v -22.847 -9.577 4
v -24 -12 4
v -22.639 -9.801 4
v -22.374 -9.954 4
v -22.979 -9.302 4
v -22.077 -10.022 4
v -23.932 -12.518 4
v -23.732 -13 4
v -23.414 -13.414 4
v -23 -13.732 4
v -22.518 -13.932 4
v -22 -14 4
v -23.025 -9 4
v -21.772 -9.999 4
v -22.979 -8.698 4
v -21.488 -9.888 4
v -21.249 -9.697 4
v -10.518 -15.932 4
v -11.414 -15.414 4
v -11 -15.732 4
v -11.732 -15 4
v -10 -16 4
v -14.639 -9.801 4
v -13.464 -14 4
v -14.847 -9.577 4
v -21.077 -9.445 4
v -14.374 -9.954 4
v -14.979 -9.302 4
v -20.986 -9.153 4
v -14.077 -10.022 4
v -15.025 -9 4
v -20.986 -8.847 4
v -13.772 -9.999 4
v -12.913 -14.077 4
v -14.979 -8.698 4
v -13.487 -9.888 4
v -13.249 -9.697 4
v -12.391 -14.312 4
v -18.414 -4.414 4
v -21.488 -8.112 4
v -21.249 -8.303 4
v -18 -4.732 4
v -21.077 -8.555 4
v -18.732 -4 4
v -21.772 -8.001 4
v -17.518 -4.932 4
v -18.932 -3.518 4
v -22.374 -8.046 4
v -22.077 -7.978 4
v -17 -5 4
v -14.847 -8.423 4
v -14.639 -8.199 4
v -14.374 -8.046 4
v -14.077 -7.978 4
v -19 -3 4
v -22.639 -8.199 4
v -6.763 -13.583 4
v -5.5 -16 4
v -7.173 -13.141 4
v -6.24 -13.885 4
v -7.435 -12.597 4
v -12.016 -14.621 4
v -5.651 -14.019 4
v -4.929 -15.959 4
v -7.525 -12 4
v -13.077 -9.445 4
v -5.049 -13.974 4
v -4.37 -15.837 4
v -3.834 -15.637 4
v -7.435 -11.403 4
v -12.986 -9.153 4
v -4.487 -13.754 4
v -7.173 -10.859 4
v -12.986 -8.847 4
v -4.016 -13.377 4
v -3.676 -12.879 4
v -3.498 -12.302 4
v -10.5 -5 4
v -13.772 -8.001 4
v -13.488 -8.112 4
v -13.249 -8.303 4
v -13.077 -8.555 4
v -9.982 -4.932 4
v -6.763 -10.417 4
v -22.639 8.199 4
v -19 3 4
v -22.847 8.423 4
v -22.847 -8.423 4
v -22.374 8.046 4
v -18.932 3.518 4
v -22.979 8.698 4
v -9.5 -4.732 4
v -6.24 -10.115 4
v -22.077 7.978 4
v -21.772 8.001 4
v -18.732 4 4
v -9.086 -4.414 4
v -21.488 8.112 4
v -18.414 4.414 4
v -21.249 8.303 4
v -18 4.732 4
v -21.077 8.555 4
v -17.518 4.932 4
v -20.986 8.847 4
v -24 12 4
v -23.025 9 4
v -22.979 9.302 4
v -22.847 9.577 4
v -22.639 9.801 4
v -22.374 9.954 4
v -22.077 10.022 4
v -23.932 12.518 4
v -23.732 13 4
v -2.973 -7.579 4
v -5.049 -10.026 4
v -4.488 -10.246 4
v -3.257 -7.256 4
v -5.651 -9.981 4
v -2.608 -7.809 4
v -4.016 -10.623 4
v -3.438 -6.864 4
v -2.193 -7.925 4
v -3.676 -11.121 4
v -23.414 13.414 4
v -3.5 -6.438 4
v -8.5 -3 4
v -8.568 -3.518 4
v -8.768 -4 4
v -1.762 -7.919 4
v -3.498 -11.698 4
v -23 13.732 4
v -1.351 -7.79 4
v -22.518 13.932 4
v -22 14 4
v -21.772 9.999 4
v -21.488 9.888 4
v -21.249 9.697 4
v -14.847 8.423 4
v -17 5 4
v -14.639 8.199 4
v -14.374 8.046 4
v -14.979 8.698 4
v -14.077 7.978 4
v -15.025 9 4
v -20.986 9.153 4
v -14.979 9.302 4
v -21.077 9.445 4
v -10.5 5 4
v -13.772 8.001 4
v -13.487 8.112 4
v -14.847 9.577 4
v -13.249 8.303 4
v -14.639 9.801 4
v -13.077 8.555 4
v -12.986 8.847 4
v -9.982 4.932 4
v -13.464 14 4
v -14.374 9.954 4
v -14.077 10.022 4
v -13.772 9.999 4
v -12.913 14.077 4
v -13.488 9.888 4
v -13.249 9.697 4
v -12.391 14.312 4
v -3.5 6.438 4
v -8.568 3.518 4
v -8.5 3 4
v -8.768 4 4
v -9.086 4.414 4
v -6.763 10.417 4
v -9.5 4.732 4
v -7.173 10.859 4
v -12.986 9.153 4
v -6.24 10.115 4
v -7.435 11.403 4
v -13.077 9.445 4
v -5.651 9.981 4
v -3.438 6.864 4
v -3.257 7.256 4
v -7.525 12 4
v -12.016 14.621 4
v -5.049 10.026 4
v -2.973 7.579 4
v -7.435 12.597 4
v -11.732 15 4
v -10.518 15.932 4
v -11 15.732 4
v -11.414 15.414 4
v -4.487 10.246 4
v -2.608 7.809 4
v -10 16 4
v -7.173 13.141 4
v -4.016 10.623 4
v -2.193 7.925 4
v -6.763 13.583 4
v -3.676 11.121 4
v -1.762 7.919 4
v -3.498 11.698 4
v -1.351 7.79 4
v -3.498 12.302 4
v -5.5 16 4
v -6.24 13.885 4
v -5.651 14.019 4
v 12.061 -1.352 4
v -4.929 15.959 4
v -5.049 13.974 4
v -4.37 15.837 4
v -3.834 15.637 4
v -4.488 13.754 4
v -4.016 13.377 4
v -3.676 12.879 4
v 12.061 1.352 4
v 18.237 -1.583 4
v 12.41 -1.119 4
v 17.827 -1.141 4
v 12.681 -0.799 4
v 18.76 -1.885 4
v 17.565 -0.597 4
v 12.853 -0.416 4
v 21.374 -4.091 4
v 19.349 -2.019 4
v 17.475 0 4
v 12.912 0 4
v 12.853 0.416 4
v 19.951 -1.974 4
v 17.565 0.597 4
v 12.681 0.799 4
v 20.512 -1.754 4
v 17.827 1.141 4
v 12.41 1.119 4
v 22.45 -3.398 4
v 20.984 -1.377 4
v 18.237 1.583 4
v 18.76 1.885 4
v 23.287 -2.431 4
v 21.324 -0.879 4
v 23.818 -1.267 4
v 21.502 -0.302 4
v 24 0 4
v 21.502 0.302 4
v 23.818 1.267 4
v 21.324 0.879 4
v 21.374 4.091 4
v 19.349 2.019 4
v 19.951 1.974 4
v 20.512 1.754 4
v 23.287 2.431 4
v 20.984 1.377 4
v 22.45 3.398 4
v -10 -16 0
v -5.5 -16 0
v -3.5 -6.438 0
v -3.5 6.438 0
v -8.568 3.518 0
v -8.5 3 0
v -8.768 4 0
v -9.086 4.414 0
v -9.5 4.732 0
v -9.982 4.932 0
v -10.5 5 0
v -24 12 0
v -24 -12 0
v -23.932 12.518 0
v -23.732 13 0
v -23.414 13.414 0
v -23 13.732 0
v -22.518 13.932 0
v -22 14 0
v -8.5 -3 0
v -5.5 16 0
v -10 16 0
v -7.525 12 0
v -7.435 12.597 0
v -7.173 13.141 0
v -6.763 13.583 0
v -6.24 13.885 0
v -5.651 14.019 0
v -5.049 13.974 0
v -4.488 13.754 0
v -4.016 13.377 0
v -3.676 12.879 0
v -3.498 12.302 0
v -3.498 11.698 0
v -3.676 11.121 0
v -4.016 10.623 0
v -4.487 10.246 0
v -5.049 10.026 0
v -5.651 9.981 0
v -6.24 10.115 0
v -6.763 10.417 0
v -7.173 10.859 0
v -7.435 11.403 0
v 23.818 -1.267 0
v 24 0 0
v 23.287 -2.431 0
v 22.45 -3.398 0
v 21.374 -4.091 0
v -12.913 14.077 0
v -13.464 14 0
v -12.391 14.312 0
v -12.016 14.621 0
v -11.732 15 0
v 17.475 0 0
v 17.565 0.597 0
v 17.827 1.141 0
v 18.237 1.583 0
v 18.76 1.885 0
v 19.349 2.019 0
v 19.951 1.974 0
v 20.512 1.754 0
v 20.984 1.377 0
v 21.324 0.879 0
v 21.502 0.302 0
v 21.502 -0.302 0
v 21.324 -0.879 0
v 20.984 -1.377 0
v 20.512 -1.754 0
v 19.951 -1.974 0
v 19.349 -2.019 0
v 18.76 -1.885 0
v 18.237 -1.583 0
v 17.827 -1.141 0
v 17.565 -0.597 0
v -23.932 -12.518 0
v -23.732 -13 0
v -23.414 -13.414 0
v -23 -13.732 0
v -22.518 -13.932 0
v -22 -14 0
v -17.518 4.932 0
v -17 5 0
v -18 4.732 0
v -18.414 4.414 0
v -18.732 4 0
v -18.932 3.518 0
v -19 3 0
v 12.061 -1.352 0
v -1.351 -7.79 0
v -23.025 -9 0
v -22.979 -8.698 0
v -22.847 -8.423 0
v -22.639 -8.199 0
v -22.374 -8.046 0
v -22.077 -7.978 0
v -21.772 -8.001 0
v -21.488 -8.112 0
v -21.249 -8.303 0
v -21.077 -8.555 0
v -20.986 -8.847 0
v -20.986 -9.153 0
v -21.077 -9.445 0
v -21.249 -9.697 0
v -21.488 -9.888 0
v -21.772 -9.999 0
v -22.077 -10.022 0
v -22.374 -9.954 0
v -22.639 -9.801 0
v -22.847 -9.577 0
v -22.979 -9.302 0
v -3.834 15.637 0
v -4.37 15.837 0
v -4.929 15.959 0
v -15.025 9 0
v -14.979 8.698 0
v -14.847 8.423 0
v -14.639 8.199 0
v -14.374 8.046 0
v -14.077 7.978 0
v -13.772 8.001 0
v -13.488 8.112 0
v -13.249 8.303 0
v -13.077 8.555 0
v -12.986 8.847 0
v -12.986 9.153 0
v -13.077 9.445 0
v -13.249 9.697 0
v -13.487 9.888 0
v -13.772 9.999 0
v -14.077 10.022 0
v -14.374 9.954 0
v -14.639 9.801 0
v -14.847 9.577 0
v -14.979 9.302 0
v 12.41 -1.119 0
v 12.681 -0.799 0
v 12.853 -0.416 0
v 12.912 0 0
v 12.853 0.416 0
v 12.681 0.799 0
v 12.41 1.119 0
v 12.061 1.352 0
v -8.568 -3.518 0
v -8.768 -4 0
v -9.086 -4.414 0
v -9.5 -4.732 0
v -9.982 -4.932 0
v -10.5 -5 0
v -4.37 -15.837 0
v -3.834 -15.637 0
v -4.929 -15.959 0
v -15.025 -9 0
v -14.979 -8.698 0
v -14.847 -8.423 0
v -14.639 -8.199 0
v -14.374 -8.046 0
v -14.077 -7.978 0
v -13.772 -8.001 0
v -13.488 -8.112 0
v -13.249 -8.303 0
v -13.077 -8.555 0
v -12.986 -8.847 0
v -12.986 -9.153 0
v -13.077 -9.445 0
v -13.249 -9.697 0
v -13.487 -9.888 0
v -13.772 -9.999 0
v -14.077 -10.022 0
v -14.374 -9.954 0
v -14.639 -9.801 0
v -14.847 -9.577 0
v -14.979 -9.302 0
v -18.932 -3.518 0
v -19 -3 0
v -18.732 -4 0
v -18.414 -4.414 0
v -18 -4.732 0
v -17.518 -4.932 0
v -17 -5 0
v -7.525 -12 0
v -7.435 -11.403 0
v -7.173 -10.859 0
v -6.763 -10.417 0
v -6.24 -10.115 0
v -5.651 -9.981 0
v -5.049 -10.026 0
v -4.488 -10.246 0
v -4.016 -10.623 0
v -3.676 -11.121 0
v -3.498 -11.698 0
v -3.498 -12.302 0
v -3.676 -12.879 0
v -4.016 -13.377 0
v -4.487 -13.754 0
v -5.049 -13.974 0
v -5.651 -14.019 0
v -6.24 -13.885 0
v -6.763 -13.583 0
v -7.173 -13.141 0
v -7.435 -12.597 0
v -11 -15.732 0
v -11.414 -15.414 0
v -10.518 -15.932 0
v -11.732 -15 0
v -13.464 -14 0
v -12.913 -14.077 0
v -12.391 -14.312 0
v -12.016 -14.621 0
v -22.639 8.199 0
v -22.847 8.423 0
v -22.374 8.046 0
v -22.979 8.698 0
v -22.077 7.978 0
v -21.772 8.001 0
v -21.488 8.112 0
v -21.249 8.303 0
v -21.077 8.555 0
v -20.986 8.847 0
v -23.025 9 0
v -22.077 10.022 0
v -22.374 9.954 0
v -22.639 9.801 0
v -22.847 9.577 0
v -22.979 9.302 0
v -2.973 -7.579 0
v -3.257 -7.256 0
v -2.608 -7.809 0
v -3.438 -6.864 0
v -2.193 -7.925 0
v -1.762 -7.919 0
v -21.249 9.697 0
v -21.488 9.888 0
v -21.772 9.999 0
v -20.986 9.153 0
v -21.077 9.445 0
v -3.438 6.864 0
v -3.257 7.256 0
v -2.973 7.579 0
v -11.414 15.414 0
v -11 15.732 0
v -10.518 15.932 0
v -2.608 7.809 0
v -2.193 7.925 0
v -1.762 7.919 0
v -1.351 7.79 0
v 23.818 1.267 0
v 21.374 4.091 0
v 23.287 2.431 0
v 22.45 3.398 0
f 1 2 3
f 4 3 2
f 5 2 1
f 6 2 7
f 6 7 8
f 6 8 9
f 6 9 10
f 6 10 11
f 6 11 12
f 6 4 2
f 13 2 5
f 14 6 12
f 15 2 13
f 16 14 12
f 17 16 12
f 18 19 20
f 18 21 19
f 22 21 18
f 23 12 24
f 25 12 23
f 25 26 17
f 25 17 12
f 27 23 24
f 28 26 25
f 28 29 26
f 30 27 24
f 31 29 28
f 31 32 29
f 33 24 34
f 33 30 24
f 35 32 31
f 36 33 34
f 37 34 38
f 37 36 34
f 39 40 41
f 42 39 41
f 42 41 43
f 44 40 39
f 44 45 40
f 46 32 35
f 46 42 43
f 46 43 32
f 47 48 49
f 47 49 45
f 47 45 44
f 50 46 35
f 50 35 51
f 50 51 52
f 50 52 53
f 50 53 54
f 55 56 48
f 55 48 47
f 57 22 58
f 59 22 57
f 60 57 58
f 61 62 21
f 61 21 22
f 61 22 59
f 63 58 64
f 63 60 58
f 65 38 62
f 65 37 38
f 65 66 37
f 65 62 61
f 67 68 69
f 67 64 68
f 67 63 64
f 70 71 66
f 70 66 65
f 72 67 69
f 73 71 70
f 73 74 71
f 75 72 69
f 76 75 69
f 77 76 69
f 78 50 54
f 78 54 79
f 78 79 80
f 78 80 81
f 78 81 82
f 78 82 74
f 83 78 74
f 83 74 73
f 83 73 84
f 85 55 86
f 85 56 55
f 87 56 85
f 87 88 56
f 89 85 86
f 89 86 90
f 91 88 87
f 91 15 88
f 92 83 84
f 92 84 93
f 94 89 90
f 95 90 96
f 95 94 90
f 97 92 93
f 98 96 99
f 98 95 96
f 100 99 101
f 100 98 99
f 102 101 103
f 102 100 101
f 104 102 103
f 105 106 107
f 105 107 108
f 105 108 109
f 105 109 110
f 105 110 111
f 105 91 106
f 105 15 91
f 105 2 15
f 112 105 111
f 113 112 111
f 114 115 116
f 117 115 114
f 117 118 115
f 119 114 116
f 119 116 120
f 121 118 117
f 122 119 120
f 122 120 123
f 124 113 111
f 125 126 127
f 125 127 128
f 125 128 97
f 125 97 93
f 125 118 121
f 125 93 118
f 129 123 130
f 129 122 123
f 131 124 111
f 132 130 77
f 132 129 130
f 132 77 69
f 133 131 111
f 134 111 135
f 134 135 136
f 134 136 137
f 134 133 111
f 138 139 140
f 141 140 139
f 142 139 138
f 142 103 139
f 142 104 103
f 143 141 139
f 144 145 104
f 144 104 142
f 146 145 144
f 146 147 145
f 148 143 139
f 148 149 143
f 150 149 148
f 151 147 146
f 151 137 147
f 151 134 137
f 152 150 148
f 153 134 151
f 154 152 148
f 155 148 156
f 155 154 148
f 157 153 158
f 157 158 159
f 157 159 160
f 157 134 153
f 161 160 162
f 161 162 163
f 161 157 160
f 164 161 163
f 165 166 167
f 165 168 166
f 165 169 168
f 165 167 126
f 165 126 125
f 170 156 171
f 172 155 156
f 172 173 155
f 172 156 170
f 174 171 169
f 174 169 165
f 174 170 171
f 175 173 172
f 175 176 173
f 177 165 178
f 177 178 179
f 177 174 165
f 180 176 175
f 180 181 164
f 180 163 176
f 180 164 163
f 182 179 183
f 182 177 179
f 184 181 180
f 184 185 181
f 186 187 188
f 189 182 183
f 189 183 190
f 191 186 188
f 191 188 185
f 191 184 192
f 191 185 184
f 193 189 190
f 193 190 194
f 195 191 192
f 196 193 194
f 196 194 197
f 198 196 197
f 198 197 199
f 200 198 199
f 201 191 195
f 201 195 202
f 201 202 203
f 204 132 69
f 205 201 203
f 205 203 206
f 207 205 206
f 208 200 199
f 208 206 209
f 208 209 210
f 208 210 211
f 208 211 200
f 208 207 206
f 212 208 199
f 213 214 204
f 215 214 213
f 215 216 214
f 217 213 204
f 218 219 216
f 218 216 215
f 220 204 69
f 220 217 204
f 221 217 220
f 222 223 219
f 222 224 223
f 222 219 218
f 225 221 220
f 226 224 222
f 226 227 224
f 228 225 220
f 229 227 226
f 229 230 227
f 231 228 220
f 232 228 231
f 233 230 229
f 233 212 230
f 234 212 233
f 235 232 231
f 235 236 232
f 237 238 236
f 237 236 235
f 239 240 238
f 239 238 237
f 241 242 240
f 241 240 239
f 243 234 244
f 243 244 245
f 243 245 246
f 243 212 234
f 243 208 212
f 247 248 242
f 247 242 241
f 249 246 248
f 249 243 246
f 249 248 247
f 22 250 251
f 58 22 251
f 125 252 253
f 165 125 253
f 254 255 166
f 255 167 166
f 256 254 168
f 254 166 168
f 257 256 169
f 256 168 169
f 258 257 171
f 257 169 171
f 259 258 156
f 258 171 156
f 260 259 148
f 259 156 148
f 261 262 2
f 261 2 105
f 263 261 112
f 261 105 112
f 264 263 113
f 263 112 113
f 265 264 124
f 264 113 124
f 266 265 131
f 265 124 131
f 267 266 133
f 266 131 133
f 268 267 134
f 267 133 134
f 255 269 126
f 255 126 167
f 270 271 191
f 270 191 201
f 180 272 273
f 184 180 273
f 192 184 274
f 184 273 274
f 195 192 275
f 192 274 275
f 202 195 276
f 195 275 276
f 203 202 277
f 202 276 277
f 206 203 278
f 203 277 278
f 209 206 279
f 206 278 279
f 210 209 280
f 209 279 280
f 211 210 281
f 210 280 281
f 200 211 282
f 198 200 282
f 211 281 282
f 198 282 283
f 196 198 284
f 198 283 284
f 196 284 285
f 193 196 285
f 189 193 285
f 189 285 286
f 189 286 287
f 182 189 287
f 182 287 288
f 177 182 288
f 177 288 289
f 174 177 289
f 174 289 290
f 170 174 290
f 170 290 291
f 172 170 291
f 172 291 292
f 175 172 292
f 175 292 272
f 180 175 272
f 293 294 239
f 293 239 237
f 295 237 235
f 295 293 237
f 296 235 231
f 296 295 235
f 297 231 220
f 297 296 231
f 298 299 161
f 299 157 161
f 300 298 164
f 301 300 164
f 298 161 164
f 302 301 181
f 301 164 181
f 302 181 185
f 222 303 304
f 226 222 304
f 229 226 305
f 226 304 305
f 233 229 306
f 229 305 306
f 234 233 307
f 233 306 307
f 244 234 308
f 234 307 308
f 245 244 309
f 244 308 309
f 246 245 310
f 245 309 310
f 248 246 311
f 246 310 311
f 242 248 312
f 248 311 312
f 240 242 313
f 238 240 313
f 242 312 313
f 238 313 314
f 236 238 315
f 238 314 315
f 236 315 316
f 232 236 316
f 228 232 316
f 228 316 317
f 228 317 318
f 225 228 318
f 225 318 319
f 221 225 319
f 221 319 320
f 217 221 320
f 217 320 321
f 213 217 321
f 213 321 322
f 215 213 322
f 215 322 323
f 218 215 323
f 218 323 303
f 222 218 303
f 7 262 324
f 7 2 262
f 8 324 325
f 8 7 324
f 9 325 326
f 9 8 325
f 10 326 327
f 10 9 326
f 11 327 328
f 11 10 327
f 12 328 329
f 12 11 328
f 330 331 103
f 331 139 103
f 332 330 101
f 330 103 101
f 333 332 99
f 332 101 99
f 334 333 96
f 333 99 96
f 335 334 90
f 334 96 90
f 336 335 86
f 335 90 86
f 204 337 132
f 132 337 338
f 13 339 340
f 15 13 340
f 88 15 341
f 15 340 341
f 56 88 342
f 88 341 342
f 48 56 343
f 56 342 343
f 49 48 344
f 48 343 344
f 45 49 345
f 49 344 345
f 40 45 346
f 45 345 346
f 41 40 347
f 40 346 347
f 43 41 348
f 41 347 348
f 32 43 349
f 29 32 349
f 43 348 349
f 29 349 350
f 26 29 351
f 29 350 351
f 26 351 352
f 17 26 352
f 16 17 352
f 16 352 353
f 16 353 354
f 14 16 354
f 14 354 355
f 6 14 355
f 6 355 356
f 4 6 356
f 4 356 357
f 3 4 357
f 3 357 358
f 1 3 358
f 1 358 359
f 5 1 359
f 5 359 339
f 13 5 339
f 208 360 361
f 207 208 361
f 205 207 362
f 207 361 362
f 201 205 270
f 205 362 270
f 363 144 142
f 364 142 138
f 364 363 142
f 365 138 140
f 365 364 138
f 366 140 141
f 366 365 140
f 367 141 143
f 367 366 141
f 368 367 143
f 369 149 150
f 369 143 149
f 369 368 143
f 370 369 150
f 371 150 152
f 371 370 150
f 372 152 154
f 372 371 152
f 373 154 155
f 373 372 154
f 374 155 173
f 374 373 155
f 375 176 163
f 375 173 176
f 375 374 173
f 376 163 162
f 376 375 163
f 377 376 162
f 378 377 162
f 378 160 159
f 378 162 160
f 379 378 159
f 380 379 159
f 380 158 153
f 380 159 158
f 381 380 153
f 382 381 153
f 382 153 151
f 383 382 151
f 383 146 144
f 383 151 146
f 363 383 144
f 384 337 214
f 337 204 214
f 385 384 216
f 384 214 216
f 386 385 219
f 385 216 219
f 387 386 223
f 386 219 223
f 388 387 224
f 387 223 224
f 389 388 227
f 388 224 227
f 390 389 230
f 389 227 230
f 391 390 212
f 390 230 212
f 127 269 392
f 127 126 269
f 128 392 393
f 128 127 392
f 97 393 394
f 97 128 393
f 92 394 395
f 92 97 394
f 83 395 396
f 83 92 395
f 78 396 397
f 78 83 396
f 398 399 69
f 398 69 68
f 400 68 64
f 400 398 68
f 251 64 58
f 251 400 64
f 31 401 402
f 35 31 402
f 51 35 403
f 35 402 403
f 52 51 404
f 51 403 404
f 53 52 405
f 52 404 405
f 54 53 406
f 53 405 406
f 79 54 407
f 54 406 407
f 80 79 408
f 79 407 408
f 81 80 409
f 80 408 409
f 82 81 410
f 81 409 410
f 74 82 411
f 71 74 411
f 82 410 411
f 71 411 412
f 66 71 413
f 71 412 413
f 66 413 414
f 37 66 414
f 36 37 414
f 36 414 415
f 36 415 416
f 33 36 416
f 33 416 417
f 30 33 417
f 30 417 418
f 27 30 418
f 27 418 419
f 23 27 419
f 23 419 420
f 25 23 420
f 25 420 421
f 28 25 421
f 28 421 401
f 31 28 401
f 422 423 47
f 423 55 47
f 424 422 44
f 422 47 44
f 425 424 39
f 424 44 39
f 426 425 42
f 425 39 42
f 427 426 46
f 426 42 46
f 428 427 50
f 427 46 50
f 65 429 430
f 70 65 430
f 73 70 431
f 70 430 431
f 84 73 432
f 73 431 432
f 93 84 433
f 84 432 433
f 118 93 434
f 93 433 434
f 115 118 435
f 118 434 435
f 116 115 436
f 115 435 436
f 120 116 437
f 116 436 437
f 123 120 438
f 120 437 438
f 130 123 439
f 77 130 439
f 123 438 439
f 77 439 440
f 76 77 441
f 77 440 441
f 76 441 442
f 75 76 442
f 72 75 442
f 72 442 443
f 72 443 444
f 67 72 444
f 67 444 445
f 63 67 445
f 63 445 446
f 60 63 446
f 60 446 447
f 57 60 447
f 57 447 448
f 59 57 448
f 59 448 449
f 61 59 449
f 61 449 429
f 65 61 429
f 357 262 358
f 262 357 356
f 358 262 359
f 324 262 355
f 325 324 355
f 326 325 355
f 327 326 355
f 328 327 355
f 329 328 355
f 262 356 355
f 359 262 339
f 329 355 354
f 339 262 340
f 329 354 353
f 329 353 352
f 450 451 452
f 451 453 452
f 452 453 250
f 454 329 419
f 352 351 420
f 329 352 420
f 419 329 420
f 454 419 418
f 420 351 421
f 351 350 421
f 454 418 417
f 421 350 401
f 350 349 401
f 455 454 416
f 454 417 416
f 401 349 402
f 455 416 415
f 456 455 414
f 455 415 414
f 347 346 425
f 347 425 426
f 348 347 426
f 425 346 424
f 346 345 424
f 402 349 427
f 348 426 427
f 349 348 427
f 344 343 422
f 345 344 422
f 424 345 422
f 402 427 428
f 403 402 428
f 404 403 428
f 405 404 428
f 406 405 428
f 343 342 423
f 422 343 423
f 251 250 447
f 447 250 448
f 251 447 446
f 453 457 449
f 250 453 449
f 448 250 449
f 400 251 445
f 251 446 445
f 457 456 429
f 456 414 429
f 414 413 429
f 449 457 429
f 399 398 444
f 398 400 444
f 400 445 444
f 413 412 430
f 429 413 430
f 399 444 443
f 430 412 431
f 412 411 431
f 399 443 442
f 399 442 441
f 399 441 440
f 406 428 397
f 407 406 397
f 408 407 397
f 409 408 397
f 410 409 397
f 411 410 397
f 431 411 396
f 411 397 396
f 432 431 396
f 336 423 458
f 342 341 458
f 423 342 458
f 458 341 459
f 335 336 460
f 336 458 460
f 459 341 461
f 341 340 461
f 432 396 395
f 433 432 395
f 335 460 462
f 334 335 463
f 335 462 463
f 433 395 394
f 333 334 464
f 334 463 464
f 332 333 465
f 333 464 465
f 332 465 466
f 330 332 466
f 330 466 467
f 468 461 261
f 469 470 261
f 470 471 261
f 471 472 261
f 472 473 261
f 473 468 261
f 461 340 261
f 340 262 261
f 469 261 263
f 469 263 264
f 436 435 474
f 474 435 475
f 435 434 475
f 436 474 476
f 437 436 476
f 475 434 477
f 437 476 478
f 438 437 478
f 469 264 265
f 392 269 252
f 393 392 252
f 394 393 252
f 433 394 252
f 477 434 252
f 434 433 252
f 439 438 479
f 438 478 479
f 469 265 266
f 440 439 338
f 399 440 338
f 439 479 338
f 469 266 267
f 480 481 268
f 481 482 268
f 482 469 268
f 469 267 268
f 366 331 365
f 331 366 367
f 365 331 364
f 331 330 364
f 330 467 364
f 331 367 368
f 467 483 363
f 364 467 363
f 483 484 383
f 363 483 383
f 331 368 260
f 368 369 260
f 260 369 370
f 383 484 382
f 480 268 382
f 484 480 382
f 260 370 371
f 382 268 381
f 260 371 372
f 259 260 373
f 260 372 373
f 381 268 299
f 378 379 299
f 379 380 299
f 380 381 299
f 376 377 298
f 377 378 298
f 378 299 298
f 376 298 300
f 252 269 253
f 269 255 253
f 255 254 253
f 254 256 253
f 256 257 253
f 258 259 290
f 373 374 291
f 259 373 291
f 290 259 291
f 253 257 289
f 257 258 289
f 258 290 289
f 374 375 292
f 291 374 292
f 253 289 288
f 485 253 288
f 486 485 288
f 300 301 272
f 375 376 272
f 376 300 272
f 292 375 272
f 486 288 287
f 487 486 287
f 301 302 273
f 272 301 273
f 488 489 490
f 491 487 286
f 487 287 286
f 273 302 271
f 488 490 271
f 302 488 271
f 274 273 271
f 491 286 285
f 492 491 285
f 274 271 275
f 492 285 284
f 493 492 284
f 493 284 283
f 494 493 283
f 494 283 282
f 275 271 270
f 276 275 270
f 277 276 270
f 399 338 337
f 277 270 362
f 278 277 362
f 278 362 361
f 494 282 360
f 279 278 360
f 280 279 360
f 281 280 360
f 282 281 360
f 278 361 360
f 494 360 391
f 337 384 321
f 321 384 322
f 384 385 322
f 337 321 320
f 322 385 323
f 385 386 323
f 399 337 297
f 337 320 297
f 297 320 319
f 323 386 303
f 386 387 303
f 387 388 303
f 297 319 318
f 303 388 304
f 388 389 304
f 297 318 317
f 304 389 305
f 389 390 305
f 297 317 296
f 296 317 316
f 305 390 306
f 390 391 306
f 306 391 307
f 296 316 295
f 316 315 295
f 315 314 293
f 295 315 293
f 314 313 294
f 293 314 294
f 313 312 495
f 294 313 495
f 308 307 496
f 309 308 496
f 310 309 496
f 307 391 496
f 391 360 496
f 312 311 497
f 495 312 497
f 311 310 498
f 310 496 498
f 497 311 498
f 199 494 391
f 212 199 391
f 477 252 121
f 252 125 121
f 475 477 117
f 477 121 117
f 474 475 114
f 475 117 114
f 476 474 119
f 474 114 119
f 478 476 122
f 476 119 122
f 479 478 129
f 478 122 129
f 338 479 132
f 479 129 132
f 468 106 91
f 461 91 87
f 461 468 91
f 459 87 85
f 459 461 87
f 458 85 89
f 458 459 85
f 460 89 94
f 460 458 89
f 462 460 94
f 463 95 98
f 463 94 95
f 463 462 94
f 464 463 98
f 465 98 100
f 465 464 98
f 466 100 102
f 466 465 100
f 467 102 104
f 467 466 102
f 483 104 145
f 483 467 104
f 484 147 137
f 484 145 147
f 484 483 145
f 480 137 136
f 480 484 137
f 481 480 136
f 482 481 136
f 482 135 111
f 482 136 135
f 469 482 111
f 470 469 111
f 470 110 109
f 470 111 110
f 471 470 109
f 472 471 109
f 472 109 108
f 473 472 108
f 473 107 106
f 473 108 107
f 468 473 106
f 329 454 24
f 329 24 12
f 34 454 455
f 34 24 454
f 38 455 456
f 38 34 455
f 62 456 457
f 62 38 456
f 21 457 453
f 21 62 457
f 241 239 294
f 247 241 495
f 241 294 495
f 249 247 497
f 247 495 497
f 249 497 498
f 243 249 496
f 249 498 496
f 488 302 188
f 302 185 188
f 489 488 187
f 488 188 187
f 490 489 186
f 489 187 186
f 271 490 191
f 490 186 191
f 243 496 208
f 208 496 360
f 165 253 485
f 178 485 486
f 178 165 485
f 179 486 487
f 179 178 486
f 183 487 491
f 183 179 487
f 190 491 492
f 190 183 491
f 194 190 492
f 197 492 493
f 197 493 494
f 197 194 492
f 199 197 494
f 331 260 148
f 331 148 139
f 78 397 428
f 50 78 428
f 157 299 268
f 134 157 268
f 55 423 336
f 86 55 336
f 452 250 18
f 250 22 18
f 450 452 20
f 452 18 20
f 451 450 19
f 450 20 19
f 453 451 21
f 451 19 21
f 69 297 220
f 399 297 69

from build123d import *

# Parameters (mm, degrees)
SKETCH_1_W          = 48
SKETCH_1_H          = 32
EXTRUDE_1_DEPTH     = 4
SKETCH_2_R          = 2.025
SKETCH_2_R_2        = 1.025
CUT_EXTRUDE_1_DEPTH = 30.8
CUT_EXTRUDE_2_DEPTH = 10
SKETCH_5_W          = 12
SKETCH_5_H          = 2
CUT_EXTRUDE_3_DEPTH = 10
FILLET_1_R          = 2
CUT_EXTRUDE_4_DEPTH = 10
FILLET_2_R          = 1.5
SKETCH_7_W          = 10.5
SKETCH_7_H          = 10
CUT_EXTRUDE_5_DEPTH = 10
FILLET_3_R          = 2


with BuildPart() as part:
    # 草图1 → 凸台-拉伸1 (new body)
    with BuildSketch(Plane.XY):
        Rectangle(SKETCH_1_W, SKETCH_1_H)
    extrude(amount=EXTRUDE_1_DEPTH)

    # 草图2 → 切除-拉伸1 (cut)
    with BuildSketch(Plane(origin=(0, 0, 0), x_dir=(-1, 0, 0), z_dir=(0, 0, -1))):
        with Locations((-19.5, 0)):
            Circle(SKETCH_2_R)
        with Locations((5.5, -12)):
            Circle(SKETCH_2_R)
        with Locations((5.5, 12)):
            Circle(SKETCH_2_R)
        with Locations((14, -9)):
            Circle(SKETCH_2_R_2)
        with Locations((22, -9)):
            Circle(SKETCH_2_R_2)
    cut_extrude_1 = extrude(amount=-CUT_EXTRUDE_1_DEPTH, mode=Mode.SUBTRACT)

    # 草图4 → 切除-拉伸2 (cut)
    with BuildSketch(Plane(origin=(0, 0, 0), x_dir=(-1, 0, 0), z_dir=(0, 0, -1))):
        with BuildLine():
            Line((-21.373826305, 4.091304802), (3.834376618, 15.636715379))
            ThreePointArc((3.834376618, 15.636715379), (4.647609689, 15.908123688), (5.5, 16))
            Line((5.5, 16), (-24, 16))
            Line((-24, 16), (-24, 0))
            ThreePointArc((-24, 0), (-23.286965696, 2.430821017), (-21.373826305, 4.091304802))
        make_face()
    cut_extrude_2 = extrude(amount=-CUT_EXTRUDE_2_DEPTH, mode=Mode.SUBTRACT)

    # 镜向1: 切除-拉伸2 across plane
    add(cut_extrude_2.mirror(Plane.ZX), mode=Mode.SUBTRACT)

    # 草图5 → 切除-拉伸3 (cut)
    with BuildSketch(Plane(origin=(0, 0, 0), x_dir=(-1, 0, 0), z_dir=(0, 0, -1))):
        with Locations((18, -15)):
            Rectangle(SKETCH_5_W, SKETCH_5_H)
        with Locations((18, 15)):
            Rectangle(SKETCH_5_W, SKETCH_5_H)
    extrude(amount=-CUT_EXTRUDE_3_DEPTH, mode=Mode.SUBTRACT)

    # 圆角1
    fillet_1_edges = [part.edges().sort_by_distance(p)[0] for p in [
        (-24, -14, 2),
        (-24, 14, 2),
        (-12, -16, 2),
        (-12, 16, 2),
    ]]
    fillet(fillet_1_edges, radius=FILLET_1_R - 0.0001)  # a hair under: the kernel refuses the full size

    # 草图6 → 切除-拉伸4 (cut)
    with BuildSketch(Plane(origin=(0, 0, 0), x_dir=(-1, 0, 0), z_dir=(0, 0, -1))):
        Polygon((3.5, 8.82153206), (-14.878191792, 0), (3.5, -8.82153206), align=None)
    extrude(amount=-CUT_EXTRUDE_4_DEPTH, mode=Mode.SUBTRACT)

    # 圆角2
    fillet_2_edges = [part.edges().sort_by_distance(p)[0] for p in [
        (-3.5, 8.82153206, 2),
        (-3.5, -8.82153206, 2),
        (14.878191792, 0, 2),
    ]]
    fillet(fillet_2_edges, radius=FILLET_2_R)

    # 镜向2: 切除-拉伸1 across plane
    add(cut_extrude_1.mirror(Plane.ZX), mode=Mode.SUBTRACT)

    # 草图7 → 切除-拉伸5 (cut)
    with BuildSketch(Plane(origin=(0, 0, 0), x_dir=(-1, 0, 0), z_dir=(0, 0, -1))):
        with Locations((13.75, 0)):
            Rectangle(SKETCH_7_W, SKETCH_7_H)
    extrude(amount=-CUT_EXTRUDE_5_DEPTH, mode=Mode.SUBTRACT)

    # 圆角3
    fillet_3_edges = [part.edges().sort_by_distance(p)[0] for p in [
        (-19, 5, 2),
        (-19, -5, 2),
        (-8.5, -5, 2),
        (-8.5, 5, 2),
        (-12, -14, 2),
        (-12, 14, 2),
    ]]
    fillet(fillet_3_edges, radius=FILLET_3_R)


solid = part.part
